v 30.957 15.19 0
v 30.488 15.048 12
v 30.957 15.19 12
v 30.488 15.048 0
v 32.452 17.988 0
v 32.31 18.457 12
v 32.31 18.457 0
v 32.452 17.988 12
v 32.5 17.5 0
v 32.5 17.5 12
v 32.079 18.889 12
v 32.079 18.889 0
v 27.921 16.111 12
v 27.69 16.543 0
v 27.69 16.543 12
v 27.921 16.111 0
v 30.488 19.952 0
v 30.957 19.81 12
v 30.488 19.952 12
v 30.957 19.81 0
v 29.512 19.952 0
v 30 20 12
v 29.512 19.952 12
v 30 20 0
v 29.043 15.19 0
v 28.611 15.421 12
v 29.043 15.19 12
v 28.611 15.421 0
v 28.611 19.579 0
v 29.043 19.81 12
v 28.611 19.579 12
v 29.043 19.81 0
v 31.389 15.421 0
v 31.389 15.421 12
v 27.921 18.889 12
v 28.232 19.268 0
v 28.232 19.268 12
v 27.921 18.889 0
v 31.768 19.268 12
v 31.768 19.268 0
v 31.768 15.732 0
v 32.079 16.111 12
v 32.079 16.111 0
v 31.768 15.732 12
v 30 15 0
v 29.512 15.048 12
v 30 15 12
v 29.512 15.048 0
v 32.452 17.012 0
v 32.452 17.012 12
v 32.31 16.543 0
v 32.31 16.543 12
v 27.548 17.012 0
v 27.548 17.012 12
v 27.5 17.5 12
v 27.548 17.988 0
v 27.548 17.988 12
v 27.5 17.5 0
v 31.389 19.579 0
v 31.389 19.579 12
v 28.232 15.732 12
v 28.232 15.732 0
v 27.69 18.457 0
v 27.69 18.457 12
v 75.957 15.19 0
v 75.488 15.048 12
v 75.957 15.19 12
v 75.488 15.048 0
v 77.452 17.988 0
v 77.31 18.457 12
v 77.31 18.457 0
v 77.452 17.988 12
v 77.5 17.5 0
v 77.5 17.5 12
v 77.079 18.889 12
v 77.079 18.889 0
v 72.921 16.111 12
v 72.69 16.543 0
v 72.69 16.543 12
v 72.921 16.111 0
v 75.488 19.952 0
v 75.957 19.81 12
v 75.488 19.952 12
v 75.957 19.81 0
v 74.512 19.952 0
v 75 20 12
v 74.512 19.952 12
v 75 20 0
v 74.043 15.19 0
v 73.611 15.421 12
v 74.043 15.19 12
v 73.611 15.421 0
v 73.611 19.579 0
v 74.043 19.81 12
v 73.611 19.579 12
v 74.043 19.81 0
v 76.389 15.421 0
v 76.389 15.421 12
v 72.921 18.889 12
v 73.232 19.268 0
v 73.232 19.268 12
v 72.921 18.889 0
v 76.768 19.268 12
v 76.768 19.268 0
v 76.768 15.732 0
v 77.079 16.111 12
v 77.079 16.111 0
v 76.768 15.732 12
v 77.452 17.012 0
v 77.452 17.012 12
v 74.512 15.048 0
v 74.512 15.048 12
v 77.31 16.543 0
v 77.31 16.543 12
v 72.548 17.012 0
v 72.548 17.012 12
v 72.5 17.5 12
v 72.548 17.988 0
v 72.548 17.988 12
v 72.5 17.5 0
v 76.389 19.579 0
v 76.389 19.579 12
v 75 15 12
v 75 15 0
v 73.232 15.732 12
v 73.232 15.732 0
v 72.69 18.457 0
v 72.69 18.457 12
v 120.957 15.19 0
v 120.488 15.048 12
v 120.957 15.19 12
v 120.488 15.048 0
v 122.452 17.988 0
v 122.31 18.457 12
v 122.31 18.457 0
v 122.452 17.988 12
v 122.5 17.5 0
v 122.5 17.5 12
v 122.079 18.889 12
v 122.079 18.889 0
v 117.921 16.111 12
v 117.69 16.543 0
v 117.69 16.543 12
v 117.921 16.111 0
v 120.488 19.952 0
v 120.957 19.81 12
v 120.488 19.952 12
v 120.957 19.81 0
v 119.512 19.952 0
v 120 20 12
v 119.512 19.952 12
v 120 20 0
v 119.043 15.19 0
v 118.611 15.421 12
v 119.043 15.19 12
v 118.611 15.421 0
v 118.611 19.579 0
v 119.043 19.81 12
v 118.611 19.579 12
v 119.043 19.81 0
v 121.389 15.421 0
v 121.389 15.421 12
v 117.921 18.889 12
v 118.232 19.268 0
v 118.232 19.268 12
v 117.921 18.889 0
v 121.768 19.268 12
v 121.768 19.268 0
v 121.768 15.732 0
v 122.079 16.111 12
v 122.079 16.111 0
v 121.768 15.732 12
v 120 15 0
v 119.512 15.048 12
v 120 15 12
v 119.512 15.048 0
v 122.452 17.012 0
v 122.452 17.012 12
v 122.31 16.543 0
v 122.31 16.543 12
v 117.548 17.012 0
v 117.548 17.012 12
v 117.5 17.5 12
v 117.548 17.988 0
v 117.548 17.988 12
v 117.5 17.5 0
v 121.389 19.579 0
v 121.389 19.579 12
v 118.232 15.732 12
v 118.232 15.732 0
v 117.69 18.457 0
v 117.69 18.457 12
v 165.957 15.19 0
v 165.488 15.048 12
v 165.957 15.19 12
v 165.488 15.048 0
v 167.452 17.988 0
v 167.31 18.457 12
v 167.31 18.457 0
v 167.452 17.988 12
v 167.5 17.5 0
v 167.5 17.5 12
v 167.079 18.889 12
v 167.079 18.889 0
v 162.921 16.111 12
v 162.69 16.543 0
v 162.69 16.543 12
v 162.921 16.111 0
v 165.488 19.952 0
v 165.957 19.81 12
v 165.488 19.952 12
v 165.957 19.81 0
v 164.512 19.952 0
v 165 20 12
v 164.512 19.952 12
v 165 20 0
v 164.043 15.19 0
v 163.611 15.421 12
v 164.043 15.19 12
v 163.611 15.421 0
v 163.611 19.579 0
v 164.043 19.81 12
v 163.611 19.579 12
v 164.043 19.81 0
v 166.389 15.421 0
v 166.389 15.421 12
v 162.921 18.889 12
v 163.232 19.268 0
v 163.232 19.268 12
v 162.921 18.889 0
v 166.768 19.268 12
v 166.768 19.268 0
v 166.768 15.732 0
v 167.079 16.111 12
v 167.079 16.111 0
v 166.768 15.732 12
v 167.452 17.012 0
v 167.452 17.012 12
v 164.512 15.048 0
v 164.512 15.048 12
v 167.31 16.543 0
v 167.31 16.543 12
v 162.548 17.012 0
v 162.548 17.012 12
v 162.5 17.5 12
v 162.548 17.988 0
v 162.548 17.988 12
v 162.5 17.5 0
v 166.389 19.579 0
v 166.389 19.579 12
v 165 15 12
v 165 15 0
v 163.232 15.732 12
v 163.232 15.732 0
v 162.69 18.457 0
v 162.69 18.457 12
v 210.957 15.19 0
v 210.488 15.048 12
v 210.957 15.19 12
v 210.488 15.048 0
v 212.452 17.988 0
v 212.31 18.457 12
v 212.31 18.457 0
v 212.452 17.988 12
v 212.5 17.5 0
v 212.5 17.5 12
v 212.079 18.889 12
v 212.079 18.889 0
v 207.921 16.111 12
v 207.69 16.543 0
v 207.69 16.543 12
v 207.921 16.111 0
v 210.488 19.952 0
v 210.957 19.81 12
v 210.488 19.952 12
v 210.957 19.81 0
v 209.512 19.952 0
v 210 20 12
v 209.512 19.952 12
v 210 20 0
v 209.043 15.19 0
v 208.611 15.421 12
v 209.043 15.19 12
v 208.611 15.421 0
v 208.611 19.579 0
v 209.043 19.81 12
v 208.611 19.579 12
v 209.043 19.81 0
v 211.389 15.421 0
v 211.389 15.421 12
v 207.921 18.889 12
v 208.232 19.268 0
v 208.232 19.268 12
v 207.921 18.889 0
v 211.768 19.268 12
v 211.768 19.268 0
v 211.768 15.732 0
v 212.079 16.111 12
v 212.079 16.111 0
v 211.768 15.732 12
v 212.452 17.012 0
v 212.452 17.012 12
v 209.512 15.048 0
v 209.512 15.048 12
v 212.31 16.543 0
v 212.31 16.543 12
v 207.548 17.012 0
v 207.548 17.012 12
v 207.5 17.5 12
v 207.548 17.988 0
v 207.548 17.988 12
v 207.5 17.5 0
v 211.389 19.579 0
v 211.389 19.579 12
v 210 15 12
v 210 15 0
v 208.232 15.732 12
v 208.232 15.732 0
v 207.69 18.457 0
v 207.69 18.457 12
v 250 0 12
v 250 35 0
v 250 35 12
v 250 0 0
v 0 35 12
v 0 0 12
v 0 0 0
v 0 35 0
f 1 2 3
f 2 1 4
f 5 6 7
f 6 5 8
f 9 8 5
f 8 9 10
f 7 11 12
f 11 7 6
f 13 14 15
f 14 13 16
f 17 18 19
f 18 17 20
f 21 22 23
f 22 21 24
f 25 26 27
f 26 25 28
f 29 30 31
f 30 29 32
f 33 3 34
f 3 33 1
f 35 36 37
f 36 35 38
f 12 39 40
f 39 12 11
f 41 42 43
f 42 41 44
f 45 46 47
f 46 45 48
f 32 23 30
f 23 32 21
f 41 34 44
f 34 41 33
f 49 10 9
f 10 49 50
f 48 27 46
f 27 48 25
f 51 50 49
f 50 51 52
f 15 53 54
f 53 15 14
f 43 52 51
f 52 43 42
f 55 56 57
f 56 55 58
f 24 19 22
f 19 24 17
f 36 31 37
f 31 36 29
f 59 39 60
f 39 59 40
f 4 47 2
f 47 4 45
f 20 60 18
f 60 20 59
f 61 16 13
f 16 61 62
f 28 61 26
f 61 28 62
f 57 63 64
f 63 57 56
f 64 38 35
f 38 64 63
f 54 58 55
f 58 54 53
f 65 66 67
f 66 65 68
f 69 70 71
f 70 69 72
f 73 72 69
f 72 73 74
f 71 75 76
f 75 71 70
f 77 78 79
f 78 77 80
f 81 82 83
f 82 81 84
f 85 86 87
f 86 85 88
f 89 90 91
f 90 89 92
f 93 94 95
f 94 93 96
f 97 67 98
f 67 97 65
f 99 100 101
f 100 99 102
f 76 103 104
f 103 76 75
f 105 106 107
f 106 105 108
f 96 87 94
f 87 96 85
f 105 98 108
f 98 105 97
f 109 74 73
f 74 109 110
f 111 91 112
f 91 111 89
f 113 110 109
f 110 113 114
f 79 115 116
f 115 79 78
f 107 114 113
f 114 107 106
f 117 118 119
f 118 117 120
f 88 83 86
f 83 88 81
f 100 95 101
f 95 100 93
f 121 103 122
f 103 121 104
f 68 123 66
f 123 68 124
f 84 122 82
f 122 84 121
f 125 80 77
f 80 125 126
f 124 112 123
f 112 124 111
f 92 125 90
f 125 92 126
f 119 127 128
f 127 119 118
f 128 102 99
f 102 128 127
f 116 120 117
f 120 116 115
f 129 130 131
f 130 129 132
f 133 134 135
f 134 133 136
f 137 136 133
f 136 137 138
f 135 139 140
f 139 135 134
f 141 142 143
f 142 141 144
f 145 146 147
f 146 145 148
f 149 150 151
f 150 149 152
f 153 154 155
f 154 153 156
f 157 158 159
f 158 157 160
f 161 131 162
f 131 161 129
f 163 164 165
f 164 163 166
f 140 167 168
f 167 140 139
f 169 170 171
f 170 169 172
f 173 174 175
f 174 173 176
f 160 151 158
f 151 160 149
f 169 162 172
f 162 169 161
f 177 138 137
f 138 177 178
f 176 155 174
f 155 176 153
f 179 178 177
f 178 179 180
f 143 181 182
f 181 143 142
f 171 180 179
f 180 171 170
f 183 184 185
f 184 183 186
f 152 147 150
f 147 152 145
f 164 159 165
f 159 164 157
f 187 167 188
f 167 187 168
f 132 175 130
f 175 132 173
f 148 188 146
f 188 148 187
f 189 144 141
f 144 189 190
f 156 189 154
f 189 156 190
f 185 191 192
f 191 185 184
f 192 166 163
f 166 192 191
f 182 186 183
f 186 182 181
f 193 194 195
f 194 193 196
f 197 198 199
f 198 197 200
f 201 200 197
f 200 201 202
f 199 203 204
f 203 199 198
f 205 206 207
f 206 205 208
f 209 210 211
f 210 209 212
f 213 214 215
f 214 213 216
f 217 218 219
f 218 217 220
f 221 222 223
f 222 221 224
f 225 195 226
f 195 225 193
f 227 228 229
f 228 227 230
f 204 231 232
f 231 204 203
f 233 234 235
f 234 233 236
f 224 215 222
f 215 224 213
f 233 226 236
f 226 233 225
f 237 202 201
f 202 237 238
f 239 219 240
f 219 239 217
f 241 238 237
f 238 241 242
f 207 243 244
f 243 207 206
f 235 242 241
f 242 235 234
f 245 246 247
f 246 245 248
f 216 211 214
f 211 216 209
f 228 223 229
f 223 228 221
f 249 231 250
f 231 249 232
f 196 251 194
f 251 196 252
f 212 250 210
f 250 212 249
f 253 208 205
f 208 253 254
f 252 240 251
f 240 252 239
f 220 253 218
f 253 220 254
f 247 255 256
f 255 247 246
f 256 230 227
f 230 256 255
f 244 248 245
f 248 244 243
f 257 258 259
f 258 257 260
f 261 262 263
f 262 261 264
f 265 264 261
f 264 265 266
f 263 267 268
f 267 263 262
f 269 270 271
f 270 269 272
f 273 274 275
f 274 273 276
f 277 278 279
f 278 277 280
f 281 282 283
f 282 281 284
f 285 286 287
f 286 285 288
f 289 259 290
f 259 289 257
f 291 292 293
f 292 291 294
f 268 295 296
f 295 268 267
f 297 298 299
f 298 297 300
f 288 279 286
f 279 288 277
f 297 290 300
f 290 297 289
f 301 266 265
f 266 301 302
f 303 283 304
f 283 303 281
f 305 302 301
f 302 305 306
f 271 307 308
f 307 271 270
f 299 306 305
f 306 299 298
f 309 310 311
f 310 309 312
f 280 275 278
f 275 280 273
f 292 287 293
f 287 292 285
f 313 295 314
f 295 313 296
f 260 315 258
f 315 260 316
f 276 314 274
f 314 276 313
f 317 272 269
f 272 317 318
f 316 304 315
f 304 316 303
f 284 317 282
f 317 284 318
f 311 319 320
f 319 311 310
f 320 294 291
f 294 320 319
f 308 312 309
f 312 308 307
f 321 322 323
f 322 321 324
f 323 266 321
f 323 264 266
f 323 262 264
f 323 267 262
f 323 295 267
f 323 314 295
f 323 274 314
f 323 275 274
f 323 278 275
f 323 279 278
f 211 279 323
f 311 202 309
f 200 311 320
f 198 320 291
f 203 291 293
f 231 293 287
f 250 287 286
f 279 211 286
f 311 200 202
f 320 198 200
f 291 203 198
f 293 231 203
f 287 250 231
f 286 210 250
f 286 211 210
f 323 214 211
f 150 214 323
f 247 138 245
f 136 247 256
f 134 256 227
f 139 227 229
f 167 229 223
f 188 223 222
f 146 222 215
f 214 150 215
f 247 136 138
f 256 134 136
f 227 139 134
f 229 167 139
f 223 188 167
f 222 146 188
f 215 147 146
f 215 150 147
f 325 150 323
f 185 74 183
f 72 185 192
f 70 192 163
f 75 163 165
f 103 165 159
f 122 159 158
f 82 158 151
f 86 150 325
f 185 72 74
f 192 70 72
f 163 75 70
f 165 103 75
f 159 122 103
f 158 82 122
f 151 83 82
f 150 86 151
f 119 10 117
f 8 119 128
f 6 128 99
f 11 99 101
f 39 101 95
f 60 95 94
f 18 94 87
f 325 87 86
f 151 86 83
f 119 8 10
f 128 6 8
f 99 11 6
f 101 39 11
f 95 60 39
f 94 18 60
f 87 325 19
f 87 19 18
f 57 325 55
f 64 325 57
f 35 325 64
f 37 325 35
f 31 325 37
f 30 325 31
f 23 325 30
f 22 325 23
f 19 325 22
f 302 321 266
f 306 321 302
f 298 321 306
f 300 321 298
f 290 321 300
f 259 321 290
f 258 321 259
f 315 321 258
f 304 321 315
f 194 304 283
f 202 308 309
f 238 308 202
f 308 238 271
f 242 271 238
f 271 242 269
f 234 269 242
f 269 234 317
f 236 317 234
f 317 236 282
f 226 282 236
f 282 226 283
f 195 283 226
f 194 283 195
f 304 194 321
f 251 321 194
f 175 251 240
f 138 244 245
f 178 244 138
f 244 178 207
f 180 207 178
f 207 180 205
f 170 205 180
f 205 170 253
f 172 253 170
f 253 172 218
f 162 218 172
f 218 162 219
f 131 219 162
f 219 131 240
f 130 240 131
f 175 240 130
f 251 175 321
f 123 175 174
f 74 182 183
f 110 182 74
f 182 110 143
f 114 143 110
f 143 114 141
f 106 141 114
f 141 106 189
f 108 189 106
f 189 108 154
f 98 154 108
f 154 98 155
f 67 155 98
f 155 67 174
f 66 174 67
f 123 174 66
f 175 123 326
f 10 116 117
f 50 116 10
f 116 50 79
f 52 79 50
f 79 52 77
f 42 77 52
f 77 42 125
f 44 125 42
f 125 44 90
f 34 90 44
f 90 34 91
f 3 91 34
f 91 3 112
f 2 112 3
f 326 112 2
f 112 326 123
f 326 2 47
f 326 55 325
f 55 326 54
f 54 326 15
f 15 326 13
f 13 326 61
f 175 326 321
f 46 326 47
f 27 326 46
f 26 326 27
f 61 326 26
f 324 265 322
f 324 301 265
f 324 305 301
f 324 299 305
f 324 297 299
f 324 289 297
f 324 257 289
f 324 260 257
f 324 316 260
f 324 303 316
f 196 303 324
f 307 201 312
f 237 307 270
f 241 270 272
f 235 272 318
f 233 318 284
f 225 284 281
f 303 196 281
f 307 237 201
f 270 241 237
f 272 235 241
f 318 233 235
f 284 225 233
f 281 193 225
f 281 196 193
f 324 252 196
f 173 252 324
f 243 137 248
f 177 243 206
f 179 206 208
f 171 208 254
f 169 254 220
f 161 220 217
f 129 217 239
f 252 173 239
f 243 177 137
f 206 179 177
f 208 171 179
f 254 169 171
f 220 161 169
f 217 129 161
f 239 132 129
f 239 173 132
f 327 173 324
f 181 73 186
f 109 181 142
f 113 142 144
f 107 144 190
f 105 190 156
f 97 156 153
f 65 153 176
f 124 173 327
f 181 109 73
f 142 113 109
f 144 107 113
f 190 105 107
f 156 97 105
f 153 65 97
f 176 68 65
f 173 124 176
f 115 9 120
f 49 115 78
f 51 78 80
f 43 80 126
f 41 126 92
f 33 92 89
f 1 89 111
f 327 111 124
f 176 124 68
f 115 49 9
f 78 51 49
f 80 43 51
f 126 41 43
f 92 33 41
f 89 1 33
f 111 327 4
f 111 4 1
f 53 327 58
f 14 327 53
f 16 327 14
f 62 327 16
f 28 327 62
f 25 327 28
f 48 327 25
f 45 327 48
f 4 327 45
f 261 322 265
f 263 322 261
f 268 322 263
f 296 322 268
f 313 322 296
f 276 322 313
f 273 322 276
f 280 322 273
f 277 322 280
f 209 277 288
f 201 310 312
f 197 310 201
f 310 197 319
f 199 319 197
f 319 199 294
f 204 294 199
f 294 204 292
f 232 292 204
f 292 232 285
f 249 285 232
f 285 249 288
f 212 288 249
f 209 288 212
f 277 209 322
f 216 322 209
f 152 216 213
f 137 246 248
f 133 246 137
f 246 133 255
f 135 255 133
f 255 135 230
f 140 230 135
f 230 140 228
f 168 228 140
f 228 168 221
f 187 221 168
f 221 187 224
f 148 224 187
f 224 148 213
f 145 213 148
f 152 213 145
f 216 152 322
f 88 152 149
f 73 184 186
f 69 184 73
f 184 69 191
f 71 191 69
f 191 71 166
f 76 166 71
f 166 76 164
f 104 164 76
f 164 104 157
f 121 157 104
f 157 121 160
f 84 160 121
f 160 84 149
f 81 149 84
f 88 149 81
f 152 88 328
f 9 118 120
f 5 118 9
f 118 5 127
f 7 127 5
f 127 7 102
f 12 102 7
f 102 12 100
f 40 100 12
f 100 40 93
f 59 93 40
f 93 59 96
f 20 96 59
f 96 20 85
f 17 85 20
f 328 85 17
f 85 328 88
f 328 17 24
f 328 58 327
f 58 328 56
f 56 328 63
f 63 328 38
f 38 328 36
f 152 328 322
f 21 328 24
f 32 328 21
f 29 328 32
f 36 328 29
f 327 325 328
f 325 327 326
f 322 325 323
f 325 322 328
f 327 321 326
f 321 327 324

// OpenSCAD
$fn = 32;

// ----------------------------------------------------------------------
// Long rail: 200-250 mm mounting rail
// ----------------------------------------------------------------------

// --- parameters (mm) ---
rail_l = 250;             // rail length, X
rail_w = 35;              // rail width, Y
rail_t = 12;              // rail thickness, Z
hole_d = 5;               // mounting hole diameter
hole_start = 30;          // first hole offset from the end
hole_pitch = 45;          // hole pitch
holes = 5;                // number of holes
fit_tol = 0.1;            // tolerance for press fits, mm
free_tol = 0.5;           // tolerance for clearance fits, mm

difference() {
  cube([rail_l, rail_w, rail_t]);
  for (i = [0 : holes - 1])
    translate([hole_start + i * hole_pitch, rail_w / 2, -1])
      cylinder(h = rail_t + 2, d = hole_d);
}
